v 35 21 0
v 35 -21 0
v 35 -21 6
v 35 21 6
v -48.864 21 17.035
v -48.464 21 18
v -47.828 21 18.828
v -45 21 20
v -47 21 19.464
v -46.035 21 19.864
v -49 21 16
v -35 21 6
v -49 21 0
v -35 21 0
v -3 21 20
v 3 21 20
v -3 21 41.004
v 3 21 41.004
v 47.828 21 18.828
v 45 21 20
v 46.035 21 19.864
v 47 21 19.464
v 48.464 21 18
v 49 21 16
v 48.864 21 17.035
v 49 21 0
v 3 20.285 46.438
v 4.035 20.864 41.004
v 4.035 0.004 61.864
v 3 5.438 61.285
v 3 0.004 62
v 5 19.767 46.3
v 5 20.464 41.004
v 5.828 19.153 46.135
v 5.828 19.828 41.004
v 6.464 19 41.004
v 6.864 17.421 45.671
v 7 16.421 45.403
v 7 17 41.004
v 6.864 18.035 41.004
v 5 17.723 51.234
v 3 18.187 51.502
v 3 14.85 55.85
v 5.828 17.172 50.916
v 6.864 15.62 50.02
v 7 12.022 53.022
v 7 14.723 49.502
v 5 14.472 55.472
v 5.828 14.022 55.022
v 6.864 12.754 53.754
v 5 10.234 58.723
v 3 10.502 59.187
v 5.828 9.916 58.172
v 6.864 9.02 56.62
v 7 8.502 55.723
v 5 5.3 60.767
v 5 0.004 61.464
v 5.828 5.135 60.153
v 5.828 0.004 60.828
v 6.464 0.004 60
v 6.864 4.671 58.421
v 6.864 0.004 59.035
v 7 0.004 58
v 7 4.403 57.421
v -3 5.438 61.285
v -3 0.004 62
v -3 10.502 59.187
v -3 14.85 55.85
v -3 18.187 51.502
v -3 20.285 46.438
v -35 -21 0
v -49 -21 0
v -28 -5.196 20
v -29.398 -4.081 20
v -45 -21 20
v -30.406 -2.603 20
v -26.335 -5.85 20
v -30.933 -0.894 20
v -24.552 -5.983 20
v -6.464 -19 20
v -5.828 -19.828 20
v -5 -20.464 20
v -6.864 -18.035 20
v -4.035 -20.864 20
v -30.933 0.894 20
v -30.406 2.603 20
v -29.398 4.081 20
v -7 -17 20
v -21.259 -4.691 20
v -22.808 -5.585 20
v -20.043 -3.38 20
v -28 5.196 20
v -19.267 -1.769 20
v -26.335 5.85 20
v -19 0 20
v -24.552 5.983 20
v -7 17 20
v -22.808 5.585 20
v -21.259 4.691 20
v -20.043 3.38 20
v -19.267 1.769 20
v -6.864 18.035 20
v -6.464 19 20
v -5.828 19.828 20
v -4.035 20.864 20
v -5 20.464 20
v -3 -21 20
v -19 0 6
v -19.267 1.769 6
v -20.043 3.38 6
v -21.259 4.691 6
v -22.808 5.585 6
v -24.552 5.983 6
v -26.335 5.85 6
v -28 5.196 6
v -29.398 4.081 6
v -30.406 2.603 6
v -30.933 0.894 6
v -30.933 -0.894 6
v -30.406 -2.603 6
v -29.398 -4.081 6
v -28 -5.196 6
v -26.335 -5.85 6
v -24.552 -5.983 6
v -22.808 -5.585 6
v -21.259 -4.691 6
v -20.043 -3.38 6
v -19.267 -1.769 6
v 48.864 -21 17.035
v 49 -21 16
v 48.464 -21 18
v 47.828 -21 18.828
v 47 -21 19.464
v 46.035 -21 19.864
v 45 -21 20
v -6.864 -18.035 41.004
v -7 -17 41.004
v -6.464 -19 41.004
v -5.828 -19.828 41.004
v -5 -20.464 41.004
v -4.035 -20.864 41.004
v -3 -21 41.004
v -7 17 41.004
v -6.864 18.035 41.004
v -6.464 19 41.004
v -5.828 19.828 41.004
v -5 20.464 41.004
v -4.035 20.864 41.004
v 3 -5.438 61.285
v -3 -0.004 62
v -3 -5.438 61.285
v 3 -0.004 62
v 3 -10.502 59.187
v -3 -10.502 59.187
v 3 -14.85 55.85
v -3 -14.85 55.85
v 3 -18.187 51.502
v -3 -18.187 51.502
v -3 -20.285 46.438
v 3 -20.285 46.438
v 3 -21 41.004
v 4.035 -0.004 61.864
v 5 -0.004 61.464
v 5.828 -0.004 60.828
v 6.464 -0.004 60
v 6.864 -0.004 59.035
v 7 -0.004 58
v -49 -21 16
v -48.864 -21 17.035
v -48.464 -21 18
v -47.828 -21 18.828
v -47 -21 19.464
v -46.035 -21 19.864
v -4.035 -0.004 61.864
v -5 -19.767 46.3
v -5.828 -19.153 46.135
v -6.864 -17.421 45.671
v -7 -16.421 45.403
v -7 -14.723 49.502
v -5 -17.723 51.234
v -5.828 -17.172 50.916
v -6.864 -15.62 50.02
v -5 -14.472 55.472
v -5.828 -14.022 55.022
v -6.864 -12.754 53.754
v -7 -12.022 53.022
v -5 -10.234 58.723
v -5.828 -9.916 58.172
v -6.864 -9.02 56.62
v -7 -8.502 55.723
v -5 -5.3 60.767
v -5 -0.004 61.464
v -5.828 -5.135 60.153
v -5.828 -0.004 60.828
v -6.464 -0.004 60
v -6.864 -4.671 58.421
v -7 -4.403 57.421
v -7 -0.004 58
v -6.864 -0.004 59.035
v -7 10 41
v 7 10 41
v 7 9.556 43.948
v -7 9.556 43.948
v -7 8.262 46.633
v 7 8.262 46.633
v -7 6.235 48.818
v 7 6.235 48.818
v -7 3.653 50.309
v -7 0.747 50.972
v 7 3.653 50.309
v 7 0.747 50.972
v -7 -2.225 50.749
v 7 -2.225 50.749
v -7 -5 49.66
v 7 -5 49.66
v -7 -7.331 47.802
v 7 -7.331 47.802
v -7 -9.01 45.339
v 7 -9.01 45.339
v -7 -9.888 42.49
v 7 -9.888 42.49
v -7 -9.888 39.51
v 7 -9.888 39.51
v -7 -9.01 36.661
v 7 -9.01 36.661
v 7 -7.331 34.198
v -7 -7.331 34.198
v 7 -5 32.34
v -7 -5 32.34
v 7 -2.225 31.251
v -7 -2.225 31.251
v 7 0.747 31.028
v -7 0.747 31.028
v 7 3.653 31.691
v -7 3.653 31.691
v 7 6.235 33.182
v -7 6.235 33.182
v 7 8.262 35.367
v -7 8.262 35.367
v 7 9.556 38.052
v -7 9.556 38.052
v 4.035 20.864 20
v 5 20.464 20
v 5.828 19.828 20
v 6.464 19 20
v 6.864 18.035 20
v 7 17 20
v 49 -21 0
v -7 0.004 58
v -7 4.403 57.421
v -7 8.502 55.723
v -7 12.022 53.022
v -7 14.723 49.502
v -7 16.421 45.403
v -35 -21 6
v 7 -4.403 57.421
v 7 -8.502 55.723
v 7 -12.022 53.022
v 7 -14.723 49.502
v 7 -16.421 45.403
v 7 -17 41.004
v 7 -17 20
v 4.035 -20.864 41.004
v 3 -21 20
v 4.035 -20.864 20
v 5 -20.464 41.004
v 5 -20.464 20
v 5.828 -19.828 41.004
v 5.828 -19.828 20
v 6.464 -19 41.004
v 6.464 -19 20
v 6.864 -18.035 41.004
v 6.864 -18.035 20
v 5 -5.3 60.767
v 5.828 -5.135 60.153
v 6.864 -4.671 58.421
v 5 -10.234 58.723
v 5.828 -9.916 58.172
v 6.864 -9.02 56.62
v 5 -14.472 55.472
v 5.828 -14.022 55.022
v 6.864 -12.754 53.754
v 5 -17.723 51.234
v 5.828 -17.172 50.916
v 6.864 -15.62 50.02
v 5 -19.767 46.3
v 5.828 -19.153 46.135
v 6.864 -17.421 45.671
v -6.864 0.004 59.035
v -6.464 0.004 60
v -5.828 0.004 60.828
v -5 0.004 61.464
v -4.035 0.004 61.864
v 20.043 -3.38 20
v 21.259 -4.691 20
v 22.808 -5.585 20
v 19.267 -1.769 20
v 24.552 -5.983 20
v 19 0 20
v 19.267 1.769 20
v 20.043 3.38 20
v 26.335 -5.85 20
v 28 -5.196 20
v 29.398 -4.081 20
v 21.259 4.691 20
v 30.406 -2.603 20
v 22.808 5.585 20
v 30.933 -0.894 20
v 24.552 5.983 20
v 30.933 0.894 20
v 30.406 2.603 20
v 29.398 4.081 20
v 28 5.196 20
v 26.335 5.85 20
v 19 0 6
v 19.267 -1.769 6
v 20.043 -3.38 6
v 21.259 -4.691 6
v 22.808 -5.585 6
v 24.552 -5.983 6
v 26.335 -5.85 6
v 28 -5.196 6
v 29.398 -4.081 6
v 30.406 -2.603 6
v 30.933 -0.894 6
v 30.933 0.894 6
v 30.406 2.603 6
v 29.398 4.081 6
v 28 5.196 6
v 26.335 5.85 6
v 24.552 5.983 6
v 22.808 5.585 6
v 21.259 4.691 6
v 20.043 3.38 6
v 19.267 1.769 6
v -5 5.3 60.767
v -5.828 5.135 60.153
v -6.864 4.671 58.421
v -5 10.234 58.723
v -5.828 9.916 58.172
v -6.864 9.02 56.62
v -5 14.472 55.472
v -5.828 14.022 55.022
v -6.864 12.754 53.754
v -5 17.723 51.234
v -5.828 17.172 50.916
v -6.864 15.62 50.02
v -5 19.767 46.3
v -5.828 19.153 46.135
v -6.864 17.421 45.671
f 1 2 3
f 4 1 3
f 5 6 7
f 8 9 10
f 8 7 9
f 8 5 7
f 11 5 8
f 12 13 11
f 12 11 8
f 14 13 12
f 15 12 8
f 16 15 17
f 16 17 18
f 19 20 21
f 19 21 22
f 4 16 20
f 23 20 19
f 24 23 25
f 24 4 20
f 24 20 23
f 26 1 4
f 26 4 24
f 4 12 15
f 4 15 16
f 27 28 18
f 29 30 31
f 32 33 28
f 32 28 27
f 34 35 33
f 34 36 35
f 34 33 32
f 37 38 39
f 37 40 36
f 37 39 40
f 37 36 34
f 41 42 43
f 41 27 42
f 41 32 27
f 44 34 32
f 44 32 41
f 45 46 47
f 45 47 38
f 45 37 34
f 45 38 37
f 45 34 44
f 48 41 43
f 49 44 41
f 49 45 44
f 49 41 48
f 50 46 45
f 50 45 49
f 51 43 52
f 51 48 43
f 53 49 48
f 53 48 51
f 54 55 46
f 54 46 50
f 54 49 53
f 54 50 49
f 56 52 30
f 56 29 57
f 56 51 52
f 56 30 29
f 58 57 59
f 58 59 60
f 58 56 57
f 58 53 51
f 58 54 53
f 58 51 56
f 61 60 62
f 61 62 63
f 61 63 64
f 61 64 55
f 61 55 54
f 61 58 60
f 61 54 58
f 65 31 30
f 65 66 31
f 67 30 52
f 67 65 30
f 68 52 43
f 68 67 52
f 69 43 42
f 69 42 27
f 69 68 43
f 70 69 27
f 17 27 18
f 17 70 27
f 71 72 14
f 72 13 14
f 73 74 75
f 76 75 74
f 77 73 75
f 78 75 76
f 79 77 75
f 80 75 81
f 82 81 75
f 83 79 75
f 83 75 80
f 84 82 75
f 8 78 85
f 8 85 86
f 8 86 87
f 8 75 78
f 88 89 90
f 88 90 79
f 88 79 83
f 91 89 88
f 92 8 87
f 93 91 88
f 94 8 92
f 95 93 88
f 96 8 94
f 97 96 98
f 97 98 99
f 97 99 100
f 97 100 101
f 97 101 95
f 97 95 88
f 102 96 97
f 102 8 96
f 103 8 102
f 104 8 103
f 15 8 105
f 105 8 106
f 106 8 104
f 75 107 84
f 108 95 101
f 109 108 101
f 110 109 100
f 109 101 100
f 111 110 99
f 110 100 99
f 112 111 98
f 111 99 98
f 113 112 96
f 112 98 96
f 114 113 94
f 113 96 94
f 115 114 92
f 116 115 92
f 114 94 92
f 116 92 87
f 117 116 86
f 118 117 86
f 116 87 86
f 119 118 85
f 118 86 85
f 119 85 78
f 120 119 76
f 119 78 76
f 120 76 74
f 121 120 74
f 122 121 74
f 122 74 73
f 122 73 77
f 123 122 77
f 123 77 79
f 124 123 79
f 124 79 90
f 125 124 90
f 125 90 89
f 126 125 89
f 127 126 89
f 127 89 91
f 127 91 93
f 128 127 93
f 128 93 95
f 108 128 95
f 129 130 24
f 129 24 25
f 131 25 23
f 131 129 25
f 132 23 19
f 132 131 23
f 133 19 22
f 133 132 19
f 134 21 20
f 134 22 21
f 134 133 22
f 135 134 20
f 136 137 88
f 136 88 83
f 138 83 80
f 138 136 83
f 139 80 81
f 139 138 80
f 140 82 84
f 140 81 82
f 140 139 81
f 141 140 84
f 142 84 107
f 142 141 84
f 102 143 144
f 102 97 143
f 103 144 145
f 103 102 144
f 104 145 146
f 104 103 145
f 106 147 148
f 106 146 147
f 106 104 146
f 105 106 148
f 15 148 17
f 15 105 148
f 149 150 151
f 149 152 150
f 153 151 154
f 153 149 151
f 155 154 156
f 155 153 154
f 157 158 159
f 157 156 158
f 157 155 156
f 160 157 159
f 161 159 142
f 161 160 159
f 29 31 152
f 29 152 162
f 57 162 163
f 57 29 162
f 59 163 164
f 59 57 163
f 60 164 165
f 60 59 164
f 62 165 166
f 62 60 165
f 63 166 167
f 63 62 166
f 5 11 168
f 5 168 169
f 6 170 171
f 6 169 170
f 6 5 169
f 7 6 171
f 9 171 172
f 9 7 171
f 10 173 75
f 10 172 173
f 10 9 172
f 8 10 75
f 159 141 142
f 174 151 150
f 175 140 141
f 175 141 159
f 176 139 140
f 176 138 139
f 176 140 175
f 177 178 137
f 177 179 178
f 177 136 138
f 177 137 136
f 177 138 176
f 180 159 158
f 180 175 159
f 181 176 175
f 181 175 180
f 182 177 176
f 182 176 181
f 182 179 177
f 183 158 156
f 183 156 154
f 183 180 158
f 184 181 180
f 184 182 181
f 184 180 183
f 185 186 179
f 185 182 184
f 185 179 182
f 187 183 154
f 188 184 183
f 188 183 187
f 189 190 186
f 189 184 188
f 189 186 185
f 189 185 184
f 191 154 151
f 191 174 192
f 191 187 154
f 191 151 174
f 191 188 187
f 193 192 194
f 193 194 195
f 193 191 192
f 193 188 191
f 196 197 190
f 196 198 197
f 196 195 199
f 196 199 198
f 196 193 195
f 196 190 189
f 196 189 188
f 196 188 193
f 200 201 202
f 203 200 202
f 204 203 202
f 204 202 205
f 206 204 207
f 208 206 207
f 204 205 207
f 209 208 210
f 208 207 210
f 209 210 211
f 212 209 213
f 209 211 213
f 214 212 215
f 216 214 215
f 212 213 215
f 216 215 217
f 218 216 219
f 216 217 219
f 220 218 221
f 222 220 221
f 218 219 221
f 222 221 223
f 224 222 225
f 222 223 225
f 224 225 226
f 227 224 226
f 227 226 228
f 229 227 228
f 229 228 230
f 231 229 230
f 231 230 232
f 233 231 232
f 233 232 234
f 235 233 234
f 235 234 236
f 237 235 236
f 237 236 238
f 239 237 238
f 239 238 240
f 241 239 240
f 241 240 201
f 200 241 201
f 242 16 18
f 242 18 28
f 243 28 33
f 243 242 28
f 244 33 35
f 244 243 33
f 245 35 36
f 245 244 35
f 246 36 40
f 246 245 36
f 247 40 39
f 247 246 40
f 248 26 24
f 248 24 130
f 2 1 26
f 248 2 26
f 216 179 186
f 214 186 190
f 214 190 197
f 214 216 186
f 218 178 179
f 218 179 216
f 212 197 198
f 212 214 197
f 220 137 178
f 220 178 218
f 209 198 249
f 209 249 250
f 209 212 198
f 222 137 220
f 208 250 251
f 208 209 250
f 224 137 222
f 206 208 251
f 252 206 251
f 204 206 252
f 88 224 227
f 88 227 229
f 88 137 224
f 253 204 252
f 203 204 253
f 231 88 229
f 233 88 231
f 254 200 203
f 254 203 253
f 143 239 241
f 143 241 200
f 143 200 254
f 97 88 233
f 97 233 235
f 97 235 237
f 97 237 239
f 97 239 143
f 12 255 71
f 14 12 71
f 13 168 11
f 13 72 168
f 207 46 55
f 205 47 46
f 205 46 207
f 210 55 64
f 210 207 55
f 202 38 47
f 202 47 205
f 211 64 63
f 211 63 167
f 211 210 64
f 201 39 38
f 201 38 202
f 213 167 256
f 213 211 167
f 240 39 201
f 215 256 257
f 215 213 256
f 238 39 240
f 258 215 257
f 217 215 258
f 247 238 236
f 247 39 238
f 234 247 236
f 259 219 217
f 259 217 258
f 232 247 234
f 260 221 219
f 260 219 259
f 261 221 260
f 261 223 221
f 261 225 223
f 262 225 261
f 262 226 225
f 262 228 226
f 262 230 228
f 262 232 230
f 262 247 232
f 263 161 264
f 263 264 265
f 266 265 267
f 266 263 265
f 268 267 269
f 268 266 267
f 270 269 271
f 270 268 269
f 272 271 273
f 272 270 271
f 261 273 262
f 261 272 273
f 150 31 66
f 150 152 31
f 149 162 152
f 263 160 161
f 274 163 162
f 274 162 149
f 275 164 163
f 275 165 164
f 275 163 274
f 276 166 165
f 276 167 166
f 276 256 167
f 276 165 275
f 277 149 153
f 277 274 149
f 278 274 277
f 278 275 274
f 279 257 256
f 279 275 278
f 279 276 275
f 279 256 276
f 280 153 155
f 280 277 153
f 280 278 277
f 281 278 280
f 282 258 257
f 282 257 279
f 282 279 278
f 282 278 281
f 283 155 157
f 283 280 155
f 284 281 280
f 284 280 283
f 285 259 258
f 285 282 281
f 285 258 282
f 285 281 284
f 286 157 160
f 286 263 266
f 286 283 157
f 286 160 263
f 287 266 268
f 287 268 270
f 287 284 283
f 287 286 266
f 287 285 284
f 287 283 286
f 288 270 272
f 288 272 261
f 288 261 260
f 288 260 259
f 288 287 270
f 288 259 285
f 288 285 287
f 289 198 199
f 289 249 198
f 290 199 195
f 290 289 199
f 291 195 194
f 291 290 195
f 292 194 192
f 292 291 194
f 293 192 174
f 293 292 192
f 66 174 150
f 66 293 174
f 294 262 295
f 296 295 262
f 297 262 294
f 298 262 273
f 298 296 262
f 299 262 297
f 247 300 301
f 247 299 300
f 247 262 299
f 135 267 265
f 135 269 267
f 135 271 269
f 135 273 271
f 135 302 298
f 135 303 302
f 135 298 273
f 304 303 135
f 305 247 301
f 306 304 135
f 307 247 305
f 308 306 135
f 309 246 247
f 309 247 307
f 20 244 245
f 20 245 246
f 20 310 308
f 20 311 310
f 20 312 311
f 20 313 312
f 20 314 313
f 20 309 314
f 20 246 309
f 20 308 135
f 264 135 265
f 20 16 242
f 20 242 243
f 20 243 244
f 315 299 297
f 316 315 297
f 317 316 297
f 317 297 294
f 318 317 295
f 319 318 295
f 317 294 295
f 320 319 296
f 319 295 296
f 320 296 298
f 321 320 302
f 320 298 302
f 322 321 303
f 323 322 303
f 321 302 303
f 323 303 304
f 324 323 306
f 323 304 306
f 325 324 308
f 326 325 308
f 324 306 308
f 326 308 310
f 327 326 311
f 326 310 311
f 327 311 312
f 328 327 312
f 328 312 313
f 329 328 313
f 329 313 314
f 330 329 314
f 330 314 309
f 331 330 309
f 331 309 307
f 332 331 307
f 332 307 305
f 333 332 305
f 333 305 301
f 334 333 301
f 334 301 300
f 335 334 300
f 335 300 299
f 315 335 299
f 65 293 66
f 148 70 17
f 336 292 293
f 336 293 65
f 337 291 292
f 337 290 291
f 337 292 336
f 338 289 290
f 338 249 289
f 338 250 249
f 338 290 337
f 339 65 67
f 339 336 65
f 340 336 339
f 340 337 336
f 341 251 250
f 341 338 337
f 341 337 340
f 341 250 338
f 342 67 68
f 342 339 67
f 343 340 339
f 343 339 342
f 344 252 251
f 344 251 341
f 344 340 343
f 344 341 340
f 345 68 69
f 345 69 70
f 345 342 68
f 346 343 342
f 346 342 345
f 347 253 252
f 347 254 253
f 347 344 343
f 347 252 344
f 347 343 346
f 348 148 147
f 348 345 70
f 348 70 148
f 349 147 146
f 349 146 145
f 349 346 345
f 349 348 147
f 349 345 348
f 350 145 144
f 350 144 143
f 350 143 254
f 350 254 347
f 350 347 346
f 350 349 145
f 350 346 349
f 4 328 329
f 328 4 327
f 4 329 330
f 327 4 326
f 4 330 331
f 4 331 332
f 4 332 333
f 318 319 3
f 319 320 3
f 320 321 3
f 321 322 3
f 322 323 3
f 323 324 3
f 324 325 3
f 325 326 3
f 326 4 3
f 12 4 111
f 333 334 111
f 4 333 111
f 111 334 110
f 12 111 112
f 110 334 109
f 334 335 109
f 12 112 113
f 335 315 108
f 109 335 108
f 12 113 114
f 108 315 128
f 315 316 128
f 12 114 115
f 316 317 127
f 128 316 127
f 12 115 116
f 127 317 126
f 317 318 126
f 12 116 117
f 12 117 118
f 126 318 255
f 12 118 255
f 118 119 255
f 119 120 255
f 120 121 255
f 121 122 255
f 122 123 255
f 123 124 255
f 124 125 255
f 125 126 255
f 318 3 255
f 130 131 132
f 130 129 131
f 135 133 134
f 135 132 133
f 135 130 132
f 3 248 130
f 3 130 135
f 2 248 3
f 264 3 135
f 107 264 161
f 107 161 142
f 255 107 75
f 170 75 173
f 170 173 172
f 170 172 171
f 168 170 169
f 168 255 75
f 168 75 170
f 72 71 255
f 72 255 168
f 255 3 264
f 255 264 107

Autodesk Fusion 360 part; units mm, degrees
sketch "Sketch1" plane through (0, 0, 0) normal (0, 0, 1) x (1, 0, 0)
  line L0 (49, -21) -> (-49, -21)
  line L1 (-49, -21) -> (-49, 21)
  line L2 (-49, 21) -> (49, 21)
  line L3 (49, 21) -> (49, -21)
  line L4 (49, -21) -> (-49, 21) construction
  line L5 (-49, -21) -> (49, 21) construction
  dimension "d1" = 98
  dimension "d2" = 42
extrude "Extrude1" add sketch "Sketch1" along normal blind 20
sketch "Sketch2" plane through (0, -21, 0) normal (0, -1, 0) x (1, 0, 0)
  line L0 (-49, 0) -> (49, 0)
  line L1 (49, 0) -> (49, 20)
  line L2 (49, 20) -> (-49, 20)
  line L3 (-49, 20) -> (-49, 0)
  line L4 (-35, 0) -> (35, 0)
  line L5 (35, 0) -> (35, 6)
  line L6 (35, 6) -> (-35, 6)
  line L7 (-35, 6) -> (-35, 0)
  dimension "d5" = 6
  dimension "d6" = 14
  dimension "d7" = 14
extrude "Extrude2" cut sketch "Sketch2" against normal through all contours L0 L4 L5 L6 L7
sketch "Sketch3" plane through (0, 0, 20) normal (0, 0, 1) x (-1, 0, 0)
  line L0 (-49, -21) -> (49, -21)
  line L1 (49, -21) -> (49, 21)
  line L2 (49, 21) -> (-49, 21)
  line L3 (-49, 21) -> (-49, -21)
  line L4 (-7, 21) -> (7, 21)
  line L5 (7, 21) -> (7, -21)
  line L6 (7, -21) -> (-7, -21)
  line L7 (-7, -21) -> (-7, 21)
  line L8 (-7, 21) -> (7, -21) construction
  line L9 (7, 21) -> (-7, -21) construction
  dimension "d9" = 14
  dimension "d10" = 42
extrude "Extrude3" add sketch "Sketch3" along normal blind 42 contours L0 L2 L4 L5 L6 L7
fillet "Fillet1" radius 21 2 edges at (0, -21, 62) (0, 21, 62)
sketch "Sketch4" plane through (7, 0, 0) normal (1, 0, 0) x (0, 1, 0)
  arc A0 (21, 41) -> (-21, 41) centre (0, 41) ccw
  line L0 (-21, 41) -> (-21, 20)
  line L1 (-21, 20) -> (21, 20)
  line L2 (21, 20) -> (21, 41)
  circle A1 centre (0, 41) radius 10
  dimension "d15" = 20
extrude "Extrude4" cut sketch "Sketch4" against normal through all contours A1
sketch "Sketch5" plane through (0, 0, 20) normal (0, 0, 1) x (-1, 0, 0)
  line L0 (-7, -21) -> (-7, 21)
  line L1 (-7, 21) -> (-49, 21)
  line L2 (-49, 21) -> (-49, -21)
  line L3 (-49, -21) -> (-7, -21)
  circle A0 centre (-25, 0) radius 6
  dimension "d17" = 12
extrude "Extrude5" cut sketch "Sketch5" against normal through all contours A0
mirror "Mirror1" about plane through (0, 0, 0) normal (1, 0, 0) of "Extrude5"
fillet "Fillet2" radius 4 8 edges at (-49, 0, 20) (-7, -21, 30.5) (-7, 0, 62) (-7, 21, 30.5) (7, -21, 30.5) (7, 0, 62) (7, 21, 30.5) (49, 0, 20)
